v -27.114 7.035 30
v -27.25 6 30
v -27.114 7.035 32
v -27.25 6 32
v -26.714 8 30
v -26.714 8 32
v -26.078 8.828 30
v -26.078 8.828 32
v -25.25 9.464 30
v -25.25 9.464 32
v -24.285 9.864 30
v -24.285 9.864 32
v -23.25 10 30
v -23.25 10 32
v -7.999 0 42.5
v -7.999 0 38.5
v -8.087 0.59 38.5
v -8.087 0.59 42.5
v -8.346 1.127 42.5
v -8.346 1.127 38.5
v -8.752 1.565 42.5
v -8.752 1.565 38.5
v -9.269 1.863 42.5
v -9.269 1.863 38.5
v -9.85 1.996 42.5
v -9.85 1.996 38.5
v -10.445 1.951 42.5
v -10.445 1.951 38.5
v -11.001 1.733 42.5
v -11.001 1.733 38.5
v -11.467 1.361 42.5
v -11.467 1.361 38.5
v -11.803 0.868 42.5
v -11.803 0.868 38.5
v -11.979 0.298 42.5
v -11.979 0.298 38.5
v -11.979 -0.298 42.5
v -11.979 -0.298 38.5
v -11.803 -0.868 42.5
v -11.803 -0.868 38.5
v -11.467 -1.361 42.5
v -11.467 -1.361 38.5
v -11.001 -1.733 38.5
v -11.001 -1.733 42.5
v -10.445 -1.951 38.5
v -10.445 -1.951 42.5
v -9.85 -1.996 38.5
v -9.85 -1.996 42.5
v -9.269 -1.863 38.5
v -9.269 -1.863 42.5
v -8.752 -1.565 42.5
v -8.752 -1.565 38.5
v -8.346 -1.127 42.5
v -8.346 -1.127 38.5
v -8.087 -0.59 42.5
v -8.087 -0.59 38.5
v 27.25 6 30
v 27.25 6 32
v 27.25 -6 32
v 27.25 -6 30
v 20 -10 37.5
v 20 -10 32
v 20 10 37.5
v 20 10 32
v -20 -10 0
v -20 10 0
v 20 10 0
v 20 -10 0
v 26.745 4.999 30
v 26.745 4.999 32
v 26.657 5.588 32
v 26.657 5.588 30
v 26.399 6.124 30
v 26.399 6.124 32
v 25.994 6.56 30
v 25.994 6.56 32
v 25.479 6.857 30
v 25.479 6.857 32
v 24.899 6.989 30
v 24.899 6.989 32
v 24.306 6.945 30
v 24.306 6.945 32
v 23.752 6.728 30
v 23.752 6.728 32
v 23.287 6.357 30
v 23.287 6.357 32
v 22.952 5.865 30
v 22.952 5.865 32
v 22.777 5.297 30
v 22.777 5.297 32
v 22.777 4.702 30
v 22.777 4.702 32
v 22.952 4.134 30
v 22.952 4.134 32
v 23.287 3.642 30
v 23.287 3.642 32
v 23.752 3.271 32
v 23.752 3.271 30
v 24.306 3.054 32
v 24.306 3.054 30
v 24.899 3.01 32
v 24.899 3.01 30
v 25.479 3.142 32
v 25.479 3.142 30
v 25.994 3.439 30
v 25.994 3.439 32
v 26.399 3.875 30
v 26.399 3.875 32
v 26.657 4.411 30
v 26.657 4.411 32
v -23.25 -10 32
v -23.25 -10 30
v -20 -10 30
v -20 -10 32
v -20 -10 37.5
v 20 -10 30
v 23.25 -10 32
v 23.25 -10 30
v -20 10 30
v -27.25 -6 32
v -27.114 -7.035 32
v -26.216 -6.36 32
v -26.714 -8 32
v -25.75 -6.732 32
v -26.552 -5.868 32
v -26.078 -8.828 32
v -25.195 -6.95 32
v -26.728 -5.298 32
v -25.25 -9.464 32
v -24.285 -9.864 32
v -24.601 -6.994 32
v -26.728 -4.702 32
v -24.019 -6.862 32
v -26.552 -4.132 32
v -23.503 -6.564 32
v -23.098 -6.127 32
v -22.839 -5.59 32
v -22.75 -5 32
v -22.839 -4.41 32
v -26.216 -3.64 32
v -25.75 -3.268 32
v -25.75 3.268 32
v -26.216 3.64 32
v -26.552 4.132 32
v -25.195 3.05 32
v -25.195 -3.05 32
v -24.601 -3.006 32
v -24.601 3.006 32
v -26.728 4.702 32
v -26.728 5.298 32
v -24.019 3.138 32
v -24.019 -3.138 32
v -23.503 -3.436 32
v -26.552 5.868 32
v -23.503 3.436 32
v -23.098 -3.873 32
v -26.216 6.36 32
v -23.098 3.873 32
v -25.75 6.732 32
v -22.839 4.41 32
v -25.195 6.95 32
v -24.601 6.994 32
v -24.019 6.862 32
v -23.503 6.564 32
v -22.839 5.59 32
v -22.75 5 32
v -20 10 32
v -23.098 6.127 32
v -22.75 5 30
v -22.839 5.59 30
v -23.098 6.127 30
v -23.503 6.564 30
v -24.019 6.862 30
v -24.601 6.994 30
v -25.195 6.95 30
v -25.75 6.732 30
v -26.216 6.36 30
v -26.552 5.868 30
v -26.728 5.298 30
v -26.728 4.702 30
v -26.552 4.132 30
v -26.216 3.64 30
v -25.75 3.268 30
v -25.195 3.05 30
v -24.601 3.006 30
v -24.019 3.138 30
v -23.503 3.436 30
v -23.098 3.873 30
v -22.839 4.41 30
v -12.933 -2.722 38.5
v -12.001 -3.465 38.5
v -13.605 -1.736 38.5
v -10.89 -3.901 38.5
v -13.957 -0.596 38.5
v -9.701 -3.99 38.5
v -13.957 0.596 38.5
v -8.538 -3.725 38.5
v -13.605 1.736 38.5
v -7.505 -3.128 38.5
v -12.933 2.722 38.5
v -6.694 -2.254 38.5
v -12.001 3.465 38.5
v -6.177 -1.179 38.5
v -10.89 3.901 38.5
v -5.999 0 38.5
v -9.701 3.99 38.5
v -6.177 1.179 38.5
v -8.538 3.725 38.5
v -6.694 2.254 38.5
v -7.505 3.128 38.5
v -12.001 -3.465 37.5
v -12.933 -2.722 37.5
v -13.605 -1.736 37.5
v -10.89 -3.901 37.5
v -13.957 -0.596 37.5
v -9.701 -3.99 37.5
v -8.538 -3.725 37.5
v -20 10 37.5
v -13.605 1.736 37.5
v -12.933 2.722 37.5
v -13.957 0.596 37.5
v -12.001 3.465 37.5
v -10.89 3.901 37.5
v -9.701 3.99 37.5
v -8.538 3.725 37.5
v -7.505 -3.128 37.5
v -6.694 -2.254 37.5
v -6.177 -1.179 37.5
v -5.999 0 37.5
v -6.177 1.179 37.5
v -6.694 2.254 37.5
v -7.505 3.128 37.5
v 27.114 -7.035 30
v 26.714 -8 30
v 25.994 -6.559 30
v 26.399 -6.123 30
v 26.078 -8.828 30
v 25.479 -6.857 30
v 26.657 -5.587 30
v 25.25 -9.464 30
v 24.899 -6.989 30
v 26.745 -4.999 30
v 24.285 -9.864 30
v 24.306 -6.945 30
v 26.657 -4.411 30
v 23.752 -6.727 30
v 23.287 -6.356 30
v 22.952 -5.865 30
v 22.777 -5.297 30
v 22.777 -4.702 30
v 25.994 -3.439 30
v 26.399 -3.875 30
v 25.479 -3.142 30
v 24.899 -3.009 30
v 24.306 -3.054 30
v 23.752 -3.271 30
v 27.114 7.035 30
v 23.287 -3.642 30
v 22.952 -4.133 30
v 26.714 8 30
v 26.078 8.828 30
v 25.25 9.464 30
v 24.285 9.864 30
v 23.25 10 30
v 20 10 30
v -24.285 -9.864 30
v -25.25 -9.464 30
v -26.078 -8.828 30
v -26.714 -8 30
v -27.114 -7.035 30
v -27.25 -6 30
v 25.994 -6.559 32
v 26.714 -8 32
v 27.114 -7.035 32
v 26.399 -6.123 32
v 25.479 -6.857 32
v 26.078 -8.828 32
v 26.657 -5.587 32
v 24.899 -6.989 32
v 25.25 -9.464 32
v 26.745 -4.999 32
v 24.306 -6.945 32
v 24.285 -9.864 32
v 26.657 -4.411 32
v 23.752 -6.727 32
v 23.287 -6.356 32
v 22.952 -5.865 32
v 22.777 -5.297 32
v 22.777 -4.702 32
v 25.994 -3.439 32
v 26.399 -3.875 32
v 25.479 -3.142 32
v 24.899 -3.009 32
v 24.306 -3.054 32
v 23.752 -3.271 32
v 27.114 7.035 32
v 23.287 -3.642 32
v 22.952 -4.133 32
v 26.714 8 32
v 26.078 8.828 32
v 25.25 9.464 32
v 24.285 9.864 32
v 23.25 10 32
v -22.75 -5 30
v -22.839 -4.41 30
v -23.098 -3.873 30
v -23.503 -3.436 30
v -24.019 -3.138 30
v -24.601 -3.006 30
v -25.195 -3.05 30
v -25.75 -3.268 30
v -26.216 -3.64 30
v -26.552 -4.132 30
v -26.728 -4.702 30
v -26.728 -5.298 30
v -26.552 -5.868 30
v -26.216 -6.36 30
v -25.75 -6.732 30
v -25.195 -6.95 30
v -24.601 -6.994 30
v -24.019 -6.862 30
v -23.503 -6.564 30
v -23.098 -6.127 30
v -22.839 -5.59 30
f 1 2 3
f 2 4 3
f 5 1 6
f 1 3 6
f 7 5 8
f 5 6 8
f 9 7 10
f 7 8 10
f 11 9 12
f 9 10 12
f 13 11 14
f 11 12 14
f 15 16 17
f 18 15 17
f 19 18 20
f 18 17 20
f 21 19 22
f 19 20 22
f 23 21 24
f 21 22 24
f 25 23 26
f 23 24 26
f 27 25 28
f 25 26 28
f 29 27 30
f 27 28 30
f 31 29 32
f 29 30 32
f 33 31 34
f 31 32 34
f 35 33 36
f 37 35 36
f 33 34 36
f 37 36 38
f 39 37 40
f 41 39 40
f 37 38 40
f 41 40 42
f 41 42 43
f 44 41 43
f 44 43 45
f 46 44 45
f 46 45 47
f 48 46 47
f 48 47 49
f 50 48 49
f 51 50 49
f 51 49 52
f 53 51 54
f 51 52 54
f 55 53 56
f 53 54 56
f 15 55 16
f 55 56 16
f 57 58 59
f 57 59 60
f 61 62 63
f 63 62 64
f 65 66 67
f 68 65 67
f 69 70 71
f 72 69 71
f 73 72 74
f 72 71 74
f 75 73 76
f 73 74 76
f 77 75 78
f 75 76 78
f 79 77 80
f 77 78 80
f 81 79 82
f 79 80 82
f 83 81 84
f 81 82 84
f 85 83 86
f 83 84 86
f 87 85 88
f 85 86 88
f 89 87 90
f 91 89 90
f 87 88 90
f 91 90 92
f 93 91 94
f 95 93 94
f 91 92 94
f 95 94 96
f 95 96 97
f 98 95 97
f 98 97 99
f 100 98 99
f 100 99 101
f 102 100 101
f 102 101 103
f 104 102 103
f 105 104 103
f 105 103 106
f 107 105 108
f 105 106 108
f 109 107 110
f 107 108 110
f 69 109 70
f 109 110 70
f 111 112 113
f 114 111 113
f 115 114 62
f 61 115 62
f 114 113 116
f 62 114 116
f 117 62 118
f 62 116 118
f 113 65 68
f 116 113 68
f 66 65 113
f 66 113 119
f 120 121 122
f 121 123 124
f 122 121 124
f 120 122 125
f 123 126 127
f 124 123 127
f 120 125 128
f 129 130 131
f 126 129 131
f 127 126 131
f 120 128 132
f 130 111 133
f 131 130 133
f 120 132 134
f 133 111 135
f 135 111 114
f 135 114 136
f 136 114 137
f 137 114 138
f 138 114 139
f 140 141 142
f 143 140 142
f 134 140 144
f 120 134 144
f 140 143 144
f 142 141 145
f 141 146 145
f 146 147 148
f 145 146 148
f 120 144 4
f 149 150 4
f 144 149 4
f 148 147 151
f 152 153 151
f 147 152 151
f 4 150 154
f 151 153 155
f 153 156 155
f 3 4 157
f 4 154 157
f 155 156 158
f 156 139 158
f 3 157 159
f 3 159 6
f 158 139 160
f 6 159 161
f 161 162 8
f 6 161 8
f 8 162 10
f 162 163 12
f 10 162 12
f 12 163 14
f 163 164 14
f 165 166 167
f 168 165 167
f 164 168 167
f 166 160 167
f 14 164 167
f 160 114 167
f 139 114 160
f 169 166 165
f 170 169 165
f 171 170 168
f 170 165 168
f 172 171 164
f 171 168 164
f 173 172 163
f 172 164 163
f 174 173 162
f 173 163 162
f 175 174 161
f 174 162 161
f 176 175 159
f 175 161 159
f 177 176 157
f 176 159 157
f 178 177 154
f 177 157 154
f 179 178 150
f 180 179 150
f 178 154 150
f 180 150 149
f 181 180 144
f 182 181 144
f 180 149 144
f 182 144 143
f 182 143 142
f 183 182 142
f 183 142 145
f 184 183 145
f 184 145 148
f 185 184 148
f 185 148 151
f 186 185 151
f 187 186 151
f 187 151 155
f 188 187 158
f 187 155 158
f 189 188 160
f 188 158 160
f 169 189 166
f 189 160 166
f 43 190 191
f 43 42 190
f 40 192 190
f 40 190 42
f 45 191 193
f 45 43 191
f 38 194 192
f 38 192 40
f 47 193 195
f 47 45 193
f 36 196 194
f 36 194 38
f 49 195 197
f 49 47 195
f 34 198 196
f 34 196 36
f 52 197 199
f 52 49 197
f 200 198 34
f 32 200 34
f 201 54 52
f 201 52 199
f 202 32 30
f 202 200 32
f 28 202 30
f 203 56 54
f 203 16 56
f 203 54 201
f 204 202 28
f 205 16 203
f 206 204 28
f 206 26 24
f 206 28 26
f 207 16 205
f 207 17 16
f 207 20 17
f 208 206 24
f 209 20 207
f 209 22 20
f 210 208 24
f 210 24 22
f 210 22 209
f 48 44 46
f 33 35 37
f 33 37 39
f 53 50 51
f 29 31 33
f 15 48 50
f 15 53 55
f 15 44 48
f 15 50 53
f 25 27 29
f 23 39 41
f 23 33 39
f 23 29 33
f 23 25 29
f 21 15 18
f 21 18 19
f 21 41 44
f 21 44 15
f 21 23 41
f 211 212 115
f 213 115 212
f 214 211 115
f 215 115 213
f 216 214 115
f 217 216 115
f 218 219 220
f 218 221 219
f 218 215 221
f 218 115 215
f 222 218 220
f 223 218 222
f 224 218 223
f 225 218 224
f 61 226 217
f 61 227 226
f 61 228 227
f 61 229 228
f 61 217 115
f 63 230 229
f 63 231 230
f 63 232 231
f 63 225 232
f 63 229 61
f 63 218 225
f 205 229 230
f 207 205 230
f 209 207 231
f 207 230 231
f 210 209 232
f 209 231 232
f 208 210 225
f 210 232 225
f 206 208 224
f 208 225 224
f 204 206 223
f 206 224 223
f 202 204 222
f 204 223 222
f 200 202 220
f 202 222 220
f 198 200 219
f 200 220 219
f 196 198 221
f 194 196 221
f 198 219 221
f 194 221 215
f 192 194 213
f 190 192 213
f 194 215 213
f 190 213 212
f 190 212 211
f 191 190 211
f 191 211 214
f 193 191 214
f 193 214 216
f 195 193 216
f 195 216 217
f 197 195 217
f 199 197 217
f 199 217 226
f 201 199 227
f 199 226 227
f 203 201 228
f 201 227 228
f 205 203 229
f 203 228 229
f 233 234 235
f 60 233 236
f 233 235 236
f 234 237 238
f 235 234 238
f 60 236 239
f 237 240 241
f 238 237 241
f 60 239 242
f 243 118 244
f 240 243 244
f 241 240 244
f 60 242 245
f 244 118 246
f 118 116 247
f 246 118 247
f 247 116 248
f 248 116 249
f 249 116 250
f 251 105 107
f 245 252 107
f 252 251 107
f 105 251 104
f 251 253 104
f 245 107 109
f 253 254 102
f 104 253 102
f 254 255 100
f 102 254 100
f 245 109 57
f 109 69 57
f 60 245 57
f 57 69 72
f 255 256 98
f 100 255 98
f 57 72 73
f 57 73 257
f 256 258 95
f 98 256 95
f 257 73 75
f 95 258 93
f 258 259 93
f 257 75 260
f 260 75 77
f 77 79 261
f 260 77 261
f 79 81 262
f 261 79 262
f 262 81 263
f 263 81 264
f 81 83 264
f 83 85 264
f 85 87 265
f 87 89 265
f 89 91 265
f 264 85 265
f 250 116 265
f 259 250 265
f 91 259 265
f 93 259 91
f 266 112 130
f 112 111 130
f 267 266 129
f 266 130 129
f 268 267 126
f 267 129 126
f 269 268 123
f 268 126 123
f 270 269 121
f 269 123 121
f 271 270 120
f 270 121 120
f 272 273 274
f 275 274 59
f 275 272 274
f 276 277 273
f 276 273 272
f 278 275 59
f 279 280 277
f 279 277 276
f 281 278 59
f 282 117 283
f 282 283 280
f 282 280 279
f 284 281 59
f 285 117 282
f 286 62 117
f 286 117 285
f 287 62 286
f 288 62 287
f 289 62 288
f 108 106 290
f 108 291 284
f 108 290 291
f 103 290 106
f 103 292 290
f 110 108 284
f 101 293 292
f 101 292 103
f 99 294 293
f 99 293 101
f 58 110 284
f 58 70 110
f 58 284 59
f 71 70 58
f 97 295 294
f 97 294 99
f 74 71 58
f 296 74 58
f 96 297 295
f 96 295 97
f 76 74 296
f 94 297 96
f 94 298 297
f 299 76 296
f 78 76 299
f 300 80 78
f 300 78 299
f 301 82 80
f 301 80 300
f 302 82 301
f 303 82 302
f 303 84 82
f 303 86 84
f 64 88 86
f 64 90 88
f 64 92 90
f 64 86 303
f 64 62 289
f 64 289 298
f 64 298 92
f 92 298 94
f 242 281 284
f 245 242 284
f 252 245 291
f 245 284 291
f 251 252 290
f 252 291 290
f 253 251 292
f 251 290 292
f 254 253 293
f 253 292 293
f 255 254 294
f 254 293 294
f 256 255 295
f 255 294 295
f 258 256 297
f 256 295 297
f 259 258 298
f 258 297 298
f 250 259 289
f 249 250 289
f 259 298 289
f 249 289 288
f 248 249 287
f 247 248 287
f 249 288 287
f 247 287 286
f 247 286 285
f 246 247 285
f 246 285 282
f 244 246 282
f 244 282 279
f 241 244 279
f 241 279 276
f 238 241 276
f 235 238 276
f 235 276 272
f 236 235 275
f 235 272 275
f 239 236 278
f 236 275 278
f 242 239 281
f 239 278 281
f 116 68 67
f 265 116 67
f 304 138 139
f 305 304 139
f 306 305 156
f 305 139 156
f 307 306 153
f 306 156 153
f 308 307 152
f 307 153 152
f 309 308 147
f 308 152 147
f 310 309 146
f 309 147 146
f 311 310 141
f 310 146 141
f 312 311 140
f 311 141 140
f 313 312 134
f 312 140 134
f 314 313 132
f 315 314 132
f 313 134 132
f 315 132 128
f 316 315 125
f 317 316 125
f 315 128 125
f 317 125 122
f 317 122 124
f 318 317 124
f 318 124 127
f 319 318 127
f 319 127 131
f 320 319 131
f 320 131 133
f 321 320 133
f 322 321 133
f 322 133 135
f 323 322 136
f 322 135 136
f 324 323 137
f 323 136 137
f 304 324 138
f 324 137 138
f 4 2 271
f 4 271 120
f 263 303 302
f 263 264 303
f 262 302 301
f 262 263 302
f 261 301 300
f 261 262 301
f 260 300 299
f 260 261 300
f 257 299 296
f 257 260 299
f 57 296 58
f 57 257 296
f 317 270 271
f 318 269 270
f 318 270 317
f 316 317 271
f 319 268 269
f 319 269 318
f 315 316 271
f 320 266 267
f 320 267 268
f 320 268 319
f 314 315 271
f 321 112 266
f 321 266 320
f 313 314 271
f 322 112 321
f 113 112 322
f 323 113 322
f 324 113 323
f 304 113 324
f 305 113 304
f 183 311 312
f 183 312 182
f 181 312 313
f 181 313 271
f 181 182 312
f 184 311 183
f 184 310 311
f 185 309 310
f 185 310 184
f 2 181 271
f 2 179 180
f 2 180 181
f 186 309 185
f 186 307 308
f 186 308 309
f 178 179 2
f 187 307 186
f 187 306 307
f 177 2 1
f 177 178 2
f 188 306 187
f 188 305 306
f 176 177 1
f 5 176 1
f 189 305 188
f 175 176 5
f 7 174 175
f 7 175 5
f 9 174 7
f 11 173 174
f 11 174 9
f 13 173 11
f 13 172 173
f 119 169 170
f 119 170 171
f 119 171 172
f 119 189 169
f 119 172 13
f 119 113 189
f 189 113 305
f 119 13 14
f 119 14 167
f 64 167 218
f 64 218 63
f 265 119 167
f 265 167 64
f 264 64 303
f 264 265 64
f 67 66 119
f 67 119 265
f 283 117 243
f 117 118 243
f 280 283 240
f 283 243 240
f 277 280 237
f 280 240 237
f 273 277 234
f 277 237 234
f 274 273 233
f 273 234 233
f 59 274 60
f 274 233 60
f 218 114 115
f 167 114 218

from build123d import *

# Parameters (mm, degrees)
SKETCH1_W           = 40
SKETCH1_H           = 20
BOSS_EXTRUDE2_DEPTH = 37.5
SKETCH2_W           = 2
SKETCH2_H           = 20
BOSS_EXTRUDE3_DEPTH = 7.25
SKETCH3_R           = 1.995473195
CUT_EXTRUDE1_DEPTH  = 2
FILLET3_R           = 4
SKETCH4_W           = 2
SKETCH4_H           = 20
BOSS_EXTRUDE4_DEPTH = 7.25
SKETCH5_R           = 2
CUT_EXTRUDE2_DEPTH  = 2
FILLET4_R           = 4
SKETCH6_R           = 4.001263217
BOSS_EXTRUDE5_DEPTH = 1
SKETCH7_R           = 2.001461963
BOSS_EXTRUDE7_DEPTH = 4


with BuildPart() as part:
    # Sketch1 → Boss-Extrude2 (new body)
    with BuildSketch(Plane.XY):
        Rectangle(SKETCH1_W, SKETCH1_H)
    extrude(amount=BOSS_EXTRUDE2_DEPTH)

    # Sketch2 → Boss-Extrude3 (add)
    with BuildSketch(Plane(origin=(20, 0, 0), x_dir=(0, 0, -1), z_dir=(1, 0, 0))):
        with Locations((-31, 0)):
            Rectangle(SKETCH2_W, SKETCH2_H)
    extrude(amount=BOSS_EXTRUDE3_DEPTH)

    # Sketch3 → Cut-Extrude1 (cut)
    with BuildSketch(Plane.XY.offset(32)):
        with Locations((24.75, -4.99913934)):
            Circle(SKETCH3_R)
        with Locations((24.75, 4.999429987)):
            Circle(SKETCH3_R)
    extrude(amount=-CUT_EXTRUDE1_DEPTH, mode=Mode.SUBTRACT)

    # Fillet3
    fillet3_edges = [part.edges().sort_by_distance(p)[0] for p in [
        (27.25, -10, 31),
        (27.25, 10, 31),
    ]]
    fillet(fillet3_edges, radius=FILLET3_R)

    # Sketch4 → Boss-Extrude4 (add)
    with BuildSketch(Plane.ZY.offset(20)):
        with Locations((31, 0)):
            Rectangle(SKETCH4_W, SKETCH4_H)
    extrude(amount=BOSS_EXTRUDE4_DEPTH)

    # Sketch5 → Cut-Extrude2 (cut)
    with BuildSketch(Plane.XY.offset(32)):
        with Locations((-24.75, 5)):
            Circle(SKETCH5_R)
        with Locations((-24.75, -5)):
            Circle(SKETCH5_R)
    extrude(amount=-CUT_EXTRUDE2_DEPTH, mode=Mode.SUBTRACT)

    # Fillet4
    fillet4_edges = [part.edges().sort_by_distance(p)[0] for p in [
        (-27.25, -10, 31),
        (-27.25, 10, 31),
    ]]
    fillet(fillet4_edges, radius=FILLET4_R)

    # Sketch6 → Boss-Extrude5 (add)
    with BuildSketch(Plane.XY.offset(37.5)):
        with Locations((-10, 0)):
            Circle(SKETCH6_R)
    extrude(amount=BOSS_EXTRUDE5_DEPTH)

    # Sketch7 → Boss-Extrude7 (add)
    with BuildSketch(Plane.XY.offset(38.5)):
        with Locations((-10, 0)):
            Circle(SKETCH7_R)
    extrude(amount=BOSS_EXTRUDE7_DEPTH)


solid = part.part
